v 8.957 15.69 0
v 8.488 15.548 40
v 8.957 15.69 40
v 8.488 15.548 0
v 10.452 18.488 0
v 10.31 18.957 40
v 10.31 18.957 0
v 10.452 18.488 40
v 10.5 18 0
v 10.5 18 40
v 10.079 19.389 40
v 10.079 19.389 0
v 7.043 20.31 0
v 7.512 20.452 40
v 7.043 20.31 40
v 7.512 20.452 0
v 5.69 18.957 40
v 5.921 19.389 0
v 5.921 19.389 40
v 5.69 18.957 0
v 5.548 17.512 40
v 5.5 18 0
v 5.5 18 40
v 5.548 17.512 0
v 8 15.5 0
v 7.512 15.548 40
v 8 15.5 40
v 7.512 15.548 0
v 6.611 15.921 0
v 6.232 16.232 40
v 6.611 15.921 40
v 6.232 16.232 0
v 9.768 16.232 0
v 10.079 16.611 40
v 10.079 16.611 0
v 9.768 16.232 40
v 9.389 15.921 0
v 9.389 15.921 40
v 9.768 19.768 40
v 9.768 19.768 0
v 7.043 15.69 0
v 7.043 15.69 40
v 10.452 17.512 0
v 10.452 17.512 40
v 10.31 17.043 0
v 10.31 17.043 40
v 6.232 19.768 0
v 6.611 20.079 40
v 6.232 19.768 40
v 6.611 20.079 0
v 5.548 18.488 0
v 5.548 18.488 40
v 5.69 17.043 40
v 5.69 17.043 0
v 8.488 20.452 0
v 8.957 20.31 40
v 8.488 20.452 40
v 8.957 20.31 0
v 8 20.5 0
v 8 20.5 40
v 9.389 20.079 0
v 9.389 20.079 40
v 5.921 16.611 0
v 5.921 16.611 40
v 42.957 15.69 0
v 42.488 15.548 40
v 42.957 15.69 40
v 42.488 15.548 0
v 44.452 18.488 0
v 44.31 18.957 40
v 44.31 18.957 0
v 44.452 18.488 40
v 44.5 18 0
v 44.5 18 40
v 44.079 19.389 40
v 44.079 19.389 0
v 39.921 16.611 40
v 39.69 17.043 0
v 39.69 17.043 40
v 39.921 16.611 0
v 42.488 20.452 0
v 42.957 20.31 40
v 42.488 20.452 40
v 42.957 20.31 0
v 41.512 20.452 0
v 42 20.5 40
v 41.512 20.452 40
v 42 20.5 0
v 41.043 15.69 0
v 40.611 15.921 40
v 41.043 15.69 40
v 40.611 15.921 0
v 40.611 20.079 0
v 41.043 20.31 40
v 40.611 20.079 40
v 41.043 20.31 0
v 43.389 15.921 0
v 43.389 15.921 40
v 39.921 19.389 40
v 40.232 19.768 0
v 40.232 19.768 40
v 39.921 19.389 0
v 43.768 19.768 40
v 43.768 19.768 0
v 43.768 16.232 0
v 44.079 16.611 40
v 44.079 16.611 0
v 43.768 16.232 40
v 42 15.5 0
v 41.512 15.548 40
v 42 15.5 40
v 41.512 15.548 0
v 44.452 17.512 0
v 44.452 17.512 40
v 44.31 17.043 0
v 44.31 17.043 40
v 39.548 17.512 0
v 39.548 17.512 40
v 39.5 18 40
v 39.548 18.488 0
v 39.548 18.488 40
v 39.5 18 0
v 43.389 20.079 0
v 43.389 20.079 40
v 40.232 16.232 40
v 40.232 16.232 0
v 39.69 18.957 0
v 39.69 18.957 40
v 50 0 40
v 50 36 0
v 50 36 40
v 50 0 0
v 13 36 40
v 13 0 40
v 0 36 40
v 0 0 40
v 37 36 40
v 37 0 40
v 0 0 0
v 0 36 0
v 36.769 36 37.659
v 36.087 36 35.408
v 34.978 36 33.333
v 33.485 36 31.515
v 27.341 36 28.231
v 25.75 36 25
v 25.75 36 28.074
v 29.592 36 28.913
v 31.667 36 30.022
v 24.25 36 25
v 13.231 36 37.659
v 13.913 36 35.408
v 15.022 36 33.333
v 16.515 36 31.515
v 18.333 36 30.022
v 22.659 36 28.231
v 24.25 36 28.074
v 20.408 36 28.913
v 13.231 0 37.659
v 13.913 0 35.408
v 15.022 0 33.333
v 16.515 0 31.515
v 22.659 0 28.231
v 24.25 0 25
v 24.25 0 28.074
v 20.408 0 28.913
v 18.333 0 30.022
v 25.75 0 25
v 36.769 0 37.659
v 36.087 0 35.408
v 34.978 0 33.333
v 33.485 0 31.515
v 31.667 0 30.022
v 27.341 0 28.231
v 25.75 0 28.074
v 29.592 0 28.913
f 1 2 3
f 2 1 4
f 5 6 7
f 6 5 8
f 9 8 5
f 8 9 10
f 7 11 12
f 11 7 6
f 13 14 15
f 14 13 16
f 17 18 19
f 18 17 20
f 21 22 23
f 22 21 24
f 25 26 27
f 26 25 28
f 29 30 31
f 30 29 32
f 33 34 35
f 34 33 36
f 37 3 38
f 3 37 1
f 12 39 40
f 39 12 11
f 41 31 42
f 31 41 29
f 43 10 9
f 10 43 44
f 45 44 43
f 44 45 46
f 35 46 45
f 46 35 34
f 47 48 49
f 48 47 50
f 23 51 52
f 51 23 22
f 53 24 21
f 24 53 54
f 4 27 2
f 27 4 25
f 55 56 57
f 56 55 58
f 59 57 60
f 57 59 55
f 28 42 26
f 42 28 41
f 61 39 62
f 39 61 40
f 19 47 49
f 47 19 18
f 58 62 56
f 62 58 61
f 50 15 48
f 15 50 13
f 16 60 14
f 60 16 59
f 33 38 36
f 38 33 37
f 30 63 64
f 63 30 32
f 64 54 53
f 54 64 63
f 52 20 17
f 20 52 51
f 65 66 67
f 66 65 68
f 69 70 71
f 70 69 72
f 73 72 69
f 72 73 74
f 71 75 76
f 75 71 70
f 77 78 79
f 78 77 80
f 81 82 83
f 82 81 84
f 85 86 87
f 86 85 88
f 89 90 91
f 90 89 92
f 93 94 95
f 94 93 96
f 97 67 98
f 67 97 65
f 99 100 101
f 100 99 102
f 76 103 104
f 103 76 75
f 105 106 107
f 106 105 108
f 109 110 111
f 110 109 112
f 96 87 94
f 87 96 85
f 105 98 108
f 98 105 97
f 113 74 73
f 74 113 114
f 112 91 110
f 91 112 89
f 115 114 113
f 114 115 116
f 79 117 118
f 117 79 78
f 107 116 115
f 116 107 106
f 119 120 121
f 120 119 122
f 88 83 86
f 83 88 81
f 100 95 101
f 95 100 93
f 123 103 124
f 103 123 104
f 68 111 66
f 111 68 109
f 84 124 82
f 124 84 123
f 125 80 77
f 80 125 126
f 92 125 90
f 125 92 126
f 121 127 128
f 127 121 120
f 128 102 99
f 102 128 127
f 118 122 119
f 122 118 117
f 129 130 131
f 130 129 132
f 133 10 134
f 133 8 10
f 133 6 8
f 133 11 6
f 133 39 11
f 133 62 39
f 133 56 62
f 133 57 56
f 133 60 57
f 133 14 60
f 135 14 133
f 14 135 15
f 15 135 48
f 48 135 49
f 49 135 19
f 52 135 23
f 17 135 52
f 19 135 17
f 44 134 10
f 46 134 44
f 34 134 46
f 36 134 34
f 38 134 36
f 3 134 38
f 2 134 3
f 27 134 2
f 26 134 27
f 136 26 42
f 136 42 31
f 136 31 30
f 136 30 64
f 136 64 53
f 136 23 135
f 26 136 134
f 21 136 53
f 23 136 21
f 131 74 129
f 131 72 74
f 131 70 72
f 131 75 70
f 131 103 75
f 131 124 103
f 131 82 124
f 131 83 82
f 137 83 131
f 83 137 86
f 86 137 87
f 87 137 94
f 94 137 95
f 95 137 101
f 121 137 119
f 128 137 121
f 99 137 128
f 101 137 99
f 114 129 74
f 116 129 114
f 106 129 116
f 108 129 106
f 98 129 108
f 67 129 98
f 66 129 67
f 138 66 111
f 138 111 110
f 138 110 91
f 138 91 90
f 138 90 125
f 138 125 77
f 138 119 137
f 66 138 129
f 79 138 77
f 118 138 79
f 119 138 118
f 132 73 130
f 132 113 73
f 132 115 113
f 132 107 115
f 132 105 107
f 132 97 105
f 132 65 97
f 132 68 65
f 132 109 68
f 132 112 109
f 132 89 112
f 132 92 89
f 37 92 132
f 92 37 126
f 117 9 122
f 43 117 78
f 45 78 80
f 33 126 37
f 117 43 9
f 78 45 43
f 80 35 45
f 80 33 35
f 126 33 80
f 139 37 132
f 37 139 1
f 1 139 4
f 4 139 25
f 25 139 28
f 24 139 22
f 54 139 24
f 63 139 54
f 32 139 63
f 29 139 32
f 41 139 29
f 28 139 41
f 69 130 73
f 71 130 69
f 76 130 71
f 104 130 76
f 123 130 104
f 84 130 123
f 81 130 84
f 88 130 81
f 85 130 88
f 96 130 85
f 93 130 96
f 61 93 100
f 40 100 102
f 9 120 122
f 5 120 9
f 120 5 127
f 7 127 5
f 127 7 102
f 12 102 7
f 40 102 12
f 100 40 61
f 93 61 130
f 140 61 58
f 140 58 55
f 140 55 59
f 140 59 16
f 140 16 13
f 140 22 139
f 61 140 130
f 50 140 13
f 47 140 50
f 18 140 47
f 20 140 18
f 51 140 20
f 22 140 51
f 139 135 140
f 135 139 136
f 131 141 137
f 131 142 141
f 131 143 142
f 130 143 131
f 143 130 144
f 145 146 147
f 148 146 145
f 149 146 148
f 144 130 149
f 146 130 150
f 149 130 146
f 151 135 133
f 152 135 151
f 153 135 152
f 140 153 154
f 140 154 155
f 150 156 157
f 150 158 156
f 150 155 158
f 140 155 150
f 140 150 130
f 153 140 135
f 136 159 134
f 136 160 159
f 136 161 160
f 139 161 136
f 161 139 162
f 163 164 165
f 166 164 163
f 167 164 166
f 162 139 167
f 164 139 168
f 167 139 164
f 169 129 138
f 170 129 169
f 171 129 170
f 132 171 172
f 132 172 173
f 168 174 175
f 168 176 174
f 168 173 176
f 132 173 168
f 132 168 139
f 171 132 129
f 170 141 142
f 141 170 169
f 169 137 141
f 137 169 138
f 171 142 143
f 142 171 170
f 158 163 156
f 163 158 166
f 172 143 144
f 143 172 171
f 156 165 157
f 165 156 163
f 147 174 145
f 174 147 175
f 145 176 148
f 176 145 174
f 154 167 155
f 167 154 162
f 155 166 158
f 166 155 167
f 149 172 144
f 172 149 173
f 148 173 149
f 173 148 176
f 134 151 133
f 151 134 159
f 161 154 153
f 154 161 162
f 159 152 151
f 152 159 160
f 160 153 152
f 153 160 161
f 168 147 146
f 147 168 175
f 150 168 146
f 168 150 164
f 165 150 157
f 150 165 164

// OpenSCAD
$fn = 32;

// ----------------------------------------------------------------------
// Saddle clamp: split shaft clamp
// ----------------------------------------------------------------------

// --- parameters (mm) ---
blk_l = 50;               // block length, X
blk_w = 36;               // block width, Y
blk_h = 40;               // block height
clamp_r = 12;             // shaft groove radius
hole_r = 2.5;             // bolt hole radius
hole_m = 8;               // bolt hole margin from the ends
saw_w = 1.5;              // saw kerf width

saw_depth = clamp_r + 3;  // saw kerf depth

difference() {
  cube([blk_l, blk_w, blk_h]);
  translate([blk_l / 2, -1, blk_h])
    rotate([-90, 0, 0])
      cylinder(h = blk_w + 2, r = clamp_r);
  for (sx = [0, 1])
    translate([sx ? blk_l - hole_m : hole_m, blk_w / 2, -1])
      cylinder(r = hole_r, h = blk_h + 2);
  translate([blk_l / 2 - saw_w / 2, -1, blk_h - saw_depth])
    cube([saw_w, blk_w + 2, saw_depth + 1]);
}
